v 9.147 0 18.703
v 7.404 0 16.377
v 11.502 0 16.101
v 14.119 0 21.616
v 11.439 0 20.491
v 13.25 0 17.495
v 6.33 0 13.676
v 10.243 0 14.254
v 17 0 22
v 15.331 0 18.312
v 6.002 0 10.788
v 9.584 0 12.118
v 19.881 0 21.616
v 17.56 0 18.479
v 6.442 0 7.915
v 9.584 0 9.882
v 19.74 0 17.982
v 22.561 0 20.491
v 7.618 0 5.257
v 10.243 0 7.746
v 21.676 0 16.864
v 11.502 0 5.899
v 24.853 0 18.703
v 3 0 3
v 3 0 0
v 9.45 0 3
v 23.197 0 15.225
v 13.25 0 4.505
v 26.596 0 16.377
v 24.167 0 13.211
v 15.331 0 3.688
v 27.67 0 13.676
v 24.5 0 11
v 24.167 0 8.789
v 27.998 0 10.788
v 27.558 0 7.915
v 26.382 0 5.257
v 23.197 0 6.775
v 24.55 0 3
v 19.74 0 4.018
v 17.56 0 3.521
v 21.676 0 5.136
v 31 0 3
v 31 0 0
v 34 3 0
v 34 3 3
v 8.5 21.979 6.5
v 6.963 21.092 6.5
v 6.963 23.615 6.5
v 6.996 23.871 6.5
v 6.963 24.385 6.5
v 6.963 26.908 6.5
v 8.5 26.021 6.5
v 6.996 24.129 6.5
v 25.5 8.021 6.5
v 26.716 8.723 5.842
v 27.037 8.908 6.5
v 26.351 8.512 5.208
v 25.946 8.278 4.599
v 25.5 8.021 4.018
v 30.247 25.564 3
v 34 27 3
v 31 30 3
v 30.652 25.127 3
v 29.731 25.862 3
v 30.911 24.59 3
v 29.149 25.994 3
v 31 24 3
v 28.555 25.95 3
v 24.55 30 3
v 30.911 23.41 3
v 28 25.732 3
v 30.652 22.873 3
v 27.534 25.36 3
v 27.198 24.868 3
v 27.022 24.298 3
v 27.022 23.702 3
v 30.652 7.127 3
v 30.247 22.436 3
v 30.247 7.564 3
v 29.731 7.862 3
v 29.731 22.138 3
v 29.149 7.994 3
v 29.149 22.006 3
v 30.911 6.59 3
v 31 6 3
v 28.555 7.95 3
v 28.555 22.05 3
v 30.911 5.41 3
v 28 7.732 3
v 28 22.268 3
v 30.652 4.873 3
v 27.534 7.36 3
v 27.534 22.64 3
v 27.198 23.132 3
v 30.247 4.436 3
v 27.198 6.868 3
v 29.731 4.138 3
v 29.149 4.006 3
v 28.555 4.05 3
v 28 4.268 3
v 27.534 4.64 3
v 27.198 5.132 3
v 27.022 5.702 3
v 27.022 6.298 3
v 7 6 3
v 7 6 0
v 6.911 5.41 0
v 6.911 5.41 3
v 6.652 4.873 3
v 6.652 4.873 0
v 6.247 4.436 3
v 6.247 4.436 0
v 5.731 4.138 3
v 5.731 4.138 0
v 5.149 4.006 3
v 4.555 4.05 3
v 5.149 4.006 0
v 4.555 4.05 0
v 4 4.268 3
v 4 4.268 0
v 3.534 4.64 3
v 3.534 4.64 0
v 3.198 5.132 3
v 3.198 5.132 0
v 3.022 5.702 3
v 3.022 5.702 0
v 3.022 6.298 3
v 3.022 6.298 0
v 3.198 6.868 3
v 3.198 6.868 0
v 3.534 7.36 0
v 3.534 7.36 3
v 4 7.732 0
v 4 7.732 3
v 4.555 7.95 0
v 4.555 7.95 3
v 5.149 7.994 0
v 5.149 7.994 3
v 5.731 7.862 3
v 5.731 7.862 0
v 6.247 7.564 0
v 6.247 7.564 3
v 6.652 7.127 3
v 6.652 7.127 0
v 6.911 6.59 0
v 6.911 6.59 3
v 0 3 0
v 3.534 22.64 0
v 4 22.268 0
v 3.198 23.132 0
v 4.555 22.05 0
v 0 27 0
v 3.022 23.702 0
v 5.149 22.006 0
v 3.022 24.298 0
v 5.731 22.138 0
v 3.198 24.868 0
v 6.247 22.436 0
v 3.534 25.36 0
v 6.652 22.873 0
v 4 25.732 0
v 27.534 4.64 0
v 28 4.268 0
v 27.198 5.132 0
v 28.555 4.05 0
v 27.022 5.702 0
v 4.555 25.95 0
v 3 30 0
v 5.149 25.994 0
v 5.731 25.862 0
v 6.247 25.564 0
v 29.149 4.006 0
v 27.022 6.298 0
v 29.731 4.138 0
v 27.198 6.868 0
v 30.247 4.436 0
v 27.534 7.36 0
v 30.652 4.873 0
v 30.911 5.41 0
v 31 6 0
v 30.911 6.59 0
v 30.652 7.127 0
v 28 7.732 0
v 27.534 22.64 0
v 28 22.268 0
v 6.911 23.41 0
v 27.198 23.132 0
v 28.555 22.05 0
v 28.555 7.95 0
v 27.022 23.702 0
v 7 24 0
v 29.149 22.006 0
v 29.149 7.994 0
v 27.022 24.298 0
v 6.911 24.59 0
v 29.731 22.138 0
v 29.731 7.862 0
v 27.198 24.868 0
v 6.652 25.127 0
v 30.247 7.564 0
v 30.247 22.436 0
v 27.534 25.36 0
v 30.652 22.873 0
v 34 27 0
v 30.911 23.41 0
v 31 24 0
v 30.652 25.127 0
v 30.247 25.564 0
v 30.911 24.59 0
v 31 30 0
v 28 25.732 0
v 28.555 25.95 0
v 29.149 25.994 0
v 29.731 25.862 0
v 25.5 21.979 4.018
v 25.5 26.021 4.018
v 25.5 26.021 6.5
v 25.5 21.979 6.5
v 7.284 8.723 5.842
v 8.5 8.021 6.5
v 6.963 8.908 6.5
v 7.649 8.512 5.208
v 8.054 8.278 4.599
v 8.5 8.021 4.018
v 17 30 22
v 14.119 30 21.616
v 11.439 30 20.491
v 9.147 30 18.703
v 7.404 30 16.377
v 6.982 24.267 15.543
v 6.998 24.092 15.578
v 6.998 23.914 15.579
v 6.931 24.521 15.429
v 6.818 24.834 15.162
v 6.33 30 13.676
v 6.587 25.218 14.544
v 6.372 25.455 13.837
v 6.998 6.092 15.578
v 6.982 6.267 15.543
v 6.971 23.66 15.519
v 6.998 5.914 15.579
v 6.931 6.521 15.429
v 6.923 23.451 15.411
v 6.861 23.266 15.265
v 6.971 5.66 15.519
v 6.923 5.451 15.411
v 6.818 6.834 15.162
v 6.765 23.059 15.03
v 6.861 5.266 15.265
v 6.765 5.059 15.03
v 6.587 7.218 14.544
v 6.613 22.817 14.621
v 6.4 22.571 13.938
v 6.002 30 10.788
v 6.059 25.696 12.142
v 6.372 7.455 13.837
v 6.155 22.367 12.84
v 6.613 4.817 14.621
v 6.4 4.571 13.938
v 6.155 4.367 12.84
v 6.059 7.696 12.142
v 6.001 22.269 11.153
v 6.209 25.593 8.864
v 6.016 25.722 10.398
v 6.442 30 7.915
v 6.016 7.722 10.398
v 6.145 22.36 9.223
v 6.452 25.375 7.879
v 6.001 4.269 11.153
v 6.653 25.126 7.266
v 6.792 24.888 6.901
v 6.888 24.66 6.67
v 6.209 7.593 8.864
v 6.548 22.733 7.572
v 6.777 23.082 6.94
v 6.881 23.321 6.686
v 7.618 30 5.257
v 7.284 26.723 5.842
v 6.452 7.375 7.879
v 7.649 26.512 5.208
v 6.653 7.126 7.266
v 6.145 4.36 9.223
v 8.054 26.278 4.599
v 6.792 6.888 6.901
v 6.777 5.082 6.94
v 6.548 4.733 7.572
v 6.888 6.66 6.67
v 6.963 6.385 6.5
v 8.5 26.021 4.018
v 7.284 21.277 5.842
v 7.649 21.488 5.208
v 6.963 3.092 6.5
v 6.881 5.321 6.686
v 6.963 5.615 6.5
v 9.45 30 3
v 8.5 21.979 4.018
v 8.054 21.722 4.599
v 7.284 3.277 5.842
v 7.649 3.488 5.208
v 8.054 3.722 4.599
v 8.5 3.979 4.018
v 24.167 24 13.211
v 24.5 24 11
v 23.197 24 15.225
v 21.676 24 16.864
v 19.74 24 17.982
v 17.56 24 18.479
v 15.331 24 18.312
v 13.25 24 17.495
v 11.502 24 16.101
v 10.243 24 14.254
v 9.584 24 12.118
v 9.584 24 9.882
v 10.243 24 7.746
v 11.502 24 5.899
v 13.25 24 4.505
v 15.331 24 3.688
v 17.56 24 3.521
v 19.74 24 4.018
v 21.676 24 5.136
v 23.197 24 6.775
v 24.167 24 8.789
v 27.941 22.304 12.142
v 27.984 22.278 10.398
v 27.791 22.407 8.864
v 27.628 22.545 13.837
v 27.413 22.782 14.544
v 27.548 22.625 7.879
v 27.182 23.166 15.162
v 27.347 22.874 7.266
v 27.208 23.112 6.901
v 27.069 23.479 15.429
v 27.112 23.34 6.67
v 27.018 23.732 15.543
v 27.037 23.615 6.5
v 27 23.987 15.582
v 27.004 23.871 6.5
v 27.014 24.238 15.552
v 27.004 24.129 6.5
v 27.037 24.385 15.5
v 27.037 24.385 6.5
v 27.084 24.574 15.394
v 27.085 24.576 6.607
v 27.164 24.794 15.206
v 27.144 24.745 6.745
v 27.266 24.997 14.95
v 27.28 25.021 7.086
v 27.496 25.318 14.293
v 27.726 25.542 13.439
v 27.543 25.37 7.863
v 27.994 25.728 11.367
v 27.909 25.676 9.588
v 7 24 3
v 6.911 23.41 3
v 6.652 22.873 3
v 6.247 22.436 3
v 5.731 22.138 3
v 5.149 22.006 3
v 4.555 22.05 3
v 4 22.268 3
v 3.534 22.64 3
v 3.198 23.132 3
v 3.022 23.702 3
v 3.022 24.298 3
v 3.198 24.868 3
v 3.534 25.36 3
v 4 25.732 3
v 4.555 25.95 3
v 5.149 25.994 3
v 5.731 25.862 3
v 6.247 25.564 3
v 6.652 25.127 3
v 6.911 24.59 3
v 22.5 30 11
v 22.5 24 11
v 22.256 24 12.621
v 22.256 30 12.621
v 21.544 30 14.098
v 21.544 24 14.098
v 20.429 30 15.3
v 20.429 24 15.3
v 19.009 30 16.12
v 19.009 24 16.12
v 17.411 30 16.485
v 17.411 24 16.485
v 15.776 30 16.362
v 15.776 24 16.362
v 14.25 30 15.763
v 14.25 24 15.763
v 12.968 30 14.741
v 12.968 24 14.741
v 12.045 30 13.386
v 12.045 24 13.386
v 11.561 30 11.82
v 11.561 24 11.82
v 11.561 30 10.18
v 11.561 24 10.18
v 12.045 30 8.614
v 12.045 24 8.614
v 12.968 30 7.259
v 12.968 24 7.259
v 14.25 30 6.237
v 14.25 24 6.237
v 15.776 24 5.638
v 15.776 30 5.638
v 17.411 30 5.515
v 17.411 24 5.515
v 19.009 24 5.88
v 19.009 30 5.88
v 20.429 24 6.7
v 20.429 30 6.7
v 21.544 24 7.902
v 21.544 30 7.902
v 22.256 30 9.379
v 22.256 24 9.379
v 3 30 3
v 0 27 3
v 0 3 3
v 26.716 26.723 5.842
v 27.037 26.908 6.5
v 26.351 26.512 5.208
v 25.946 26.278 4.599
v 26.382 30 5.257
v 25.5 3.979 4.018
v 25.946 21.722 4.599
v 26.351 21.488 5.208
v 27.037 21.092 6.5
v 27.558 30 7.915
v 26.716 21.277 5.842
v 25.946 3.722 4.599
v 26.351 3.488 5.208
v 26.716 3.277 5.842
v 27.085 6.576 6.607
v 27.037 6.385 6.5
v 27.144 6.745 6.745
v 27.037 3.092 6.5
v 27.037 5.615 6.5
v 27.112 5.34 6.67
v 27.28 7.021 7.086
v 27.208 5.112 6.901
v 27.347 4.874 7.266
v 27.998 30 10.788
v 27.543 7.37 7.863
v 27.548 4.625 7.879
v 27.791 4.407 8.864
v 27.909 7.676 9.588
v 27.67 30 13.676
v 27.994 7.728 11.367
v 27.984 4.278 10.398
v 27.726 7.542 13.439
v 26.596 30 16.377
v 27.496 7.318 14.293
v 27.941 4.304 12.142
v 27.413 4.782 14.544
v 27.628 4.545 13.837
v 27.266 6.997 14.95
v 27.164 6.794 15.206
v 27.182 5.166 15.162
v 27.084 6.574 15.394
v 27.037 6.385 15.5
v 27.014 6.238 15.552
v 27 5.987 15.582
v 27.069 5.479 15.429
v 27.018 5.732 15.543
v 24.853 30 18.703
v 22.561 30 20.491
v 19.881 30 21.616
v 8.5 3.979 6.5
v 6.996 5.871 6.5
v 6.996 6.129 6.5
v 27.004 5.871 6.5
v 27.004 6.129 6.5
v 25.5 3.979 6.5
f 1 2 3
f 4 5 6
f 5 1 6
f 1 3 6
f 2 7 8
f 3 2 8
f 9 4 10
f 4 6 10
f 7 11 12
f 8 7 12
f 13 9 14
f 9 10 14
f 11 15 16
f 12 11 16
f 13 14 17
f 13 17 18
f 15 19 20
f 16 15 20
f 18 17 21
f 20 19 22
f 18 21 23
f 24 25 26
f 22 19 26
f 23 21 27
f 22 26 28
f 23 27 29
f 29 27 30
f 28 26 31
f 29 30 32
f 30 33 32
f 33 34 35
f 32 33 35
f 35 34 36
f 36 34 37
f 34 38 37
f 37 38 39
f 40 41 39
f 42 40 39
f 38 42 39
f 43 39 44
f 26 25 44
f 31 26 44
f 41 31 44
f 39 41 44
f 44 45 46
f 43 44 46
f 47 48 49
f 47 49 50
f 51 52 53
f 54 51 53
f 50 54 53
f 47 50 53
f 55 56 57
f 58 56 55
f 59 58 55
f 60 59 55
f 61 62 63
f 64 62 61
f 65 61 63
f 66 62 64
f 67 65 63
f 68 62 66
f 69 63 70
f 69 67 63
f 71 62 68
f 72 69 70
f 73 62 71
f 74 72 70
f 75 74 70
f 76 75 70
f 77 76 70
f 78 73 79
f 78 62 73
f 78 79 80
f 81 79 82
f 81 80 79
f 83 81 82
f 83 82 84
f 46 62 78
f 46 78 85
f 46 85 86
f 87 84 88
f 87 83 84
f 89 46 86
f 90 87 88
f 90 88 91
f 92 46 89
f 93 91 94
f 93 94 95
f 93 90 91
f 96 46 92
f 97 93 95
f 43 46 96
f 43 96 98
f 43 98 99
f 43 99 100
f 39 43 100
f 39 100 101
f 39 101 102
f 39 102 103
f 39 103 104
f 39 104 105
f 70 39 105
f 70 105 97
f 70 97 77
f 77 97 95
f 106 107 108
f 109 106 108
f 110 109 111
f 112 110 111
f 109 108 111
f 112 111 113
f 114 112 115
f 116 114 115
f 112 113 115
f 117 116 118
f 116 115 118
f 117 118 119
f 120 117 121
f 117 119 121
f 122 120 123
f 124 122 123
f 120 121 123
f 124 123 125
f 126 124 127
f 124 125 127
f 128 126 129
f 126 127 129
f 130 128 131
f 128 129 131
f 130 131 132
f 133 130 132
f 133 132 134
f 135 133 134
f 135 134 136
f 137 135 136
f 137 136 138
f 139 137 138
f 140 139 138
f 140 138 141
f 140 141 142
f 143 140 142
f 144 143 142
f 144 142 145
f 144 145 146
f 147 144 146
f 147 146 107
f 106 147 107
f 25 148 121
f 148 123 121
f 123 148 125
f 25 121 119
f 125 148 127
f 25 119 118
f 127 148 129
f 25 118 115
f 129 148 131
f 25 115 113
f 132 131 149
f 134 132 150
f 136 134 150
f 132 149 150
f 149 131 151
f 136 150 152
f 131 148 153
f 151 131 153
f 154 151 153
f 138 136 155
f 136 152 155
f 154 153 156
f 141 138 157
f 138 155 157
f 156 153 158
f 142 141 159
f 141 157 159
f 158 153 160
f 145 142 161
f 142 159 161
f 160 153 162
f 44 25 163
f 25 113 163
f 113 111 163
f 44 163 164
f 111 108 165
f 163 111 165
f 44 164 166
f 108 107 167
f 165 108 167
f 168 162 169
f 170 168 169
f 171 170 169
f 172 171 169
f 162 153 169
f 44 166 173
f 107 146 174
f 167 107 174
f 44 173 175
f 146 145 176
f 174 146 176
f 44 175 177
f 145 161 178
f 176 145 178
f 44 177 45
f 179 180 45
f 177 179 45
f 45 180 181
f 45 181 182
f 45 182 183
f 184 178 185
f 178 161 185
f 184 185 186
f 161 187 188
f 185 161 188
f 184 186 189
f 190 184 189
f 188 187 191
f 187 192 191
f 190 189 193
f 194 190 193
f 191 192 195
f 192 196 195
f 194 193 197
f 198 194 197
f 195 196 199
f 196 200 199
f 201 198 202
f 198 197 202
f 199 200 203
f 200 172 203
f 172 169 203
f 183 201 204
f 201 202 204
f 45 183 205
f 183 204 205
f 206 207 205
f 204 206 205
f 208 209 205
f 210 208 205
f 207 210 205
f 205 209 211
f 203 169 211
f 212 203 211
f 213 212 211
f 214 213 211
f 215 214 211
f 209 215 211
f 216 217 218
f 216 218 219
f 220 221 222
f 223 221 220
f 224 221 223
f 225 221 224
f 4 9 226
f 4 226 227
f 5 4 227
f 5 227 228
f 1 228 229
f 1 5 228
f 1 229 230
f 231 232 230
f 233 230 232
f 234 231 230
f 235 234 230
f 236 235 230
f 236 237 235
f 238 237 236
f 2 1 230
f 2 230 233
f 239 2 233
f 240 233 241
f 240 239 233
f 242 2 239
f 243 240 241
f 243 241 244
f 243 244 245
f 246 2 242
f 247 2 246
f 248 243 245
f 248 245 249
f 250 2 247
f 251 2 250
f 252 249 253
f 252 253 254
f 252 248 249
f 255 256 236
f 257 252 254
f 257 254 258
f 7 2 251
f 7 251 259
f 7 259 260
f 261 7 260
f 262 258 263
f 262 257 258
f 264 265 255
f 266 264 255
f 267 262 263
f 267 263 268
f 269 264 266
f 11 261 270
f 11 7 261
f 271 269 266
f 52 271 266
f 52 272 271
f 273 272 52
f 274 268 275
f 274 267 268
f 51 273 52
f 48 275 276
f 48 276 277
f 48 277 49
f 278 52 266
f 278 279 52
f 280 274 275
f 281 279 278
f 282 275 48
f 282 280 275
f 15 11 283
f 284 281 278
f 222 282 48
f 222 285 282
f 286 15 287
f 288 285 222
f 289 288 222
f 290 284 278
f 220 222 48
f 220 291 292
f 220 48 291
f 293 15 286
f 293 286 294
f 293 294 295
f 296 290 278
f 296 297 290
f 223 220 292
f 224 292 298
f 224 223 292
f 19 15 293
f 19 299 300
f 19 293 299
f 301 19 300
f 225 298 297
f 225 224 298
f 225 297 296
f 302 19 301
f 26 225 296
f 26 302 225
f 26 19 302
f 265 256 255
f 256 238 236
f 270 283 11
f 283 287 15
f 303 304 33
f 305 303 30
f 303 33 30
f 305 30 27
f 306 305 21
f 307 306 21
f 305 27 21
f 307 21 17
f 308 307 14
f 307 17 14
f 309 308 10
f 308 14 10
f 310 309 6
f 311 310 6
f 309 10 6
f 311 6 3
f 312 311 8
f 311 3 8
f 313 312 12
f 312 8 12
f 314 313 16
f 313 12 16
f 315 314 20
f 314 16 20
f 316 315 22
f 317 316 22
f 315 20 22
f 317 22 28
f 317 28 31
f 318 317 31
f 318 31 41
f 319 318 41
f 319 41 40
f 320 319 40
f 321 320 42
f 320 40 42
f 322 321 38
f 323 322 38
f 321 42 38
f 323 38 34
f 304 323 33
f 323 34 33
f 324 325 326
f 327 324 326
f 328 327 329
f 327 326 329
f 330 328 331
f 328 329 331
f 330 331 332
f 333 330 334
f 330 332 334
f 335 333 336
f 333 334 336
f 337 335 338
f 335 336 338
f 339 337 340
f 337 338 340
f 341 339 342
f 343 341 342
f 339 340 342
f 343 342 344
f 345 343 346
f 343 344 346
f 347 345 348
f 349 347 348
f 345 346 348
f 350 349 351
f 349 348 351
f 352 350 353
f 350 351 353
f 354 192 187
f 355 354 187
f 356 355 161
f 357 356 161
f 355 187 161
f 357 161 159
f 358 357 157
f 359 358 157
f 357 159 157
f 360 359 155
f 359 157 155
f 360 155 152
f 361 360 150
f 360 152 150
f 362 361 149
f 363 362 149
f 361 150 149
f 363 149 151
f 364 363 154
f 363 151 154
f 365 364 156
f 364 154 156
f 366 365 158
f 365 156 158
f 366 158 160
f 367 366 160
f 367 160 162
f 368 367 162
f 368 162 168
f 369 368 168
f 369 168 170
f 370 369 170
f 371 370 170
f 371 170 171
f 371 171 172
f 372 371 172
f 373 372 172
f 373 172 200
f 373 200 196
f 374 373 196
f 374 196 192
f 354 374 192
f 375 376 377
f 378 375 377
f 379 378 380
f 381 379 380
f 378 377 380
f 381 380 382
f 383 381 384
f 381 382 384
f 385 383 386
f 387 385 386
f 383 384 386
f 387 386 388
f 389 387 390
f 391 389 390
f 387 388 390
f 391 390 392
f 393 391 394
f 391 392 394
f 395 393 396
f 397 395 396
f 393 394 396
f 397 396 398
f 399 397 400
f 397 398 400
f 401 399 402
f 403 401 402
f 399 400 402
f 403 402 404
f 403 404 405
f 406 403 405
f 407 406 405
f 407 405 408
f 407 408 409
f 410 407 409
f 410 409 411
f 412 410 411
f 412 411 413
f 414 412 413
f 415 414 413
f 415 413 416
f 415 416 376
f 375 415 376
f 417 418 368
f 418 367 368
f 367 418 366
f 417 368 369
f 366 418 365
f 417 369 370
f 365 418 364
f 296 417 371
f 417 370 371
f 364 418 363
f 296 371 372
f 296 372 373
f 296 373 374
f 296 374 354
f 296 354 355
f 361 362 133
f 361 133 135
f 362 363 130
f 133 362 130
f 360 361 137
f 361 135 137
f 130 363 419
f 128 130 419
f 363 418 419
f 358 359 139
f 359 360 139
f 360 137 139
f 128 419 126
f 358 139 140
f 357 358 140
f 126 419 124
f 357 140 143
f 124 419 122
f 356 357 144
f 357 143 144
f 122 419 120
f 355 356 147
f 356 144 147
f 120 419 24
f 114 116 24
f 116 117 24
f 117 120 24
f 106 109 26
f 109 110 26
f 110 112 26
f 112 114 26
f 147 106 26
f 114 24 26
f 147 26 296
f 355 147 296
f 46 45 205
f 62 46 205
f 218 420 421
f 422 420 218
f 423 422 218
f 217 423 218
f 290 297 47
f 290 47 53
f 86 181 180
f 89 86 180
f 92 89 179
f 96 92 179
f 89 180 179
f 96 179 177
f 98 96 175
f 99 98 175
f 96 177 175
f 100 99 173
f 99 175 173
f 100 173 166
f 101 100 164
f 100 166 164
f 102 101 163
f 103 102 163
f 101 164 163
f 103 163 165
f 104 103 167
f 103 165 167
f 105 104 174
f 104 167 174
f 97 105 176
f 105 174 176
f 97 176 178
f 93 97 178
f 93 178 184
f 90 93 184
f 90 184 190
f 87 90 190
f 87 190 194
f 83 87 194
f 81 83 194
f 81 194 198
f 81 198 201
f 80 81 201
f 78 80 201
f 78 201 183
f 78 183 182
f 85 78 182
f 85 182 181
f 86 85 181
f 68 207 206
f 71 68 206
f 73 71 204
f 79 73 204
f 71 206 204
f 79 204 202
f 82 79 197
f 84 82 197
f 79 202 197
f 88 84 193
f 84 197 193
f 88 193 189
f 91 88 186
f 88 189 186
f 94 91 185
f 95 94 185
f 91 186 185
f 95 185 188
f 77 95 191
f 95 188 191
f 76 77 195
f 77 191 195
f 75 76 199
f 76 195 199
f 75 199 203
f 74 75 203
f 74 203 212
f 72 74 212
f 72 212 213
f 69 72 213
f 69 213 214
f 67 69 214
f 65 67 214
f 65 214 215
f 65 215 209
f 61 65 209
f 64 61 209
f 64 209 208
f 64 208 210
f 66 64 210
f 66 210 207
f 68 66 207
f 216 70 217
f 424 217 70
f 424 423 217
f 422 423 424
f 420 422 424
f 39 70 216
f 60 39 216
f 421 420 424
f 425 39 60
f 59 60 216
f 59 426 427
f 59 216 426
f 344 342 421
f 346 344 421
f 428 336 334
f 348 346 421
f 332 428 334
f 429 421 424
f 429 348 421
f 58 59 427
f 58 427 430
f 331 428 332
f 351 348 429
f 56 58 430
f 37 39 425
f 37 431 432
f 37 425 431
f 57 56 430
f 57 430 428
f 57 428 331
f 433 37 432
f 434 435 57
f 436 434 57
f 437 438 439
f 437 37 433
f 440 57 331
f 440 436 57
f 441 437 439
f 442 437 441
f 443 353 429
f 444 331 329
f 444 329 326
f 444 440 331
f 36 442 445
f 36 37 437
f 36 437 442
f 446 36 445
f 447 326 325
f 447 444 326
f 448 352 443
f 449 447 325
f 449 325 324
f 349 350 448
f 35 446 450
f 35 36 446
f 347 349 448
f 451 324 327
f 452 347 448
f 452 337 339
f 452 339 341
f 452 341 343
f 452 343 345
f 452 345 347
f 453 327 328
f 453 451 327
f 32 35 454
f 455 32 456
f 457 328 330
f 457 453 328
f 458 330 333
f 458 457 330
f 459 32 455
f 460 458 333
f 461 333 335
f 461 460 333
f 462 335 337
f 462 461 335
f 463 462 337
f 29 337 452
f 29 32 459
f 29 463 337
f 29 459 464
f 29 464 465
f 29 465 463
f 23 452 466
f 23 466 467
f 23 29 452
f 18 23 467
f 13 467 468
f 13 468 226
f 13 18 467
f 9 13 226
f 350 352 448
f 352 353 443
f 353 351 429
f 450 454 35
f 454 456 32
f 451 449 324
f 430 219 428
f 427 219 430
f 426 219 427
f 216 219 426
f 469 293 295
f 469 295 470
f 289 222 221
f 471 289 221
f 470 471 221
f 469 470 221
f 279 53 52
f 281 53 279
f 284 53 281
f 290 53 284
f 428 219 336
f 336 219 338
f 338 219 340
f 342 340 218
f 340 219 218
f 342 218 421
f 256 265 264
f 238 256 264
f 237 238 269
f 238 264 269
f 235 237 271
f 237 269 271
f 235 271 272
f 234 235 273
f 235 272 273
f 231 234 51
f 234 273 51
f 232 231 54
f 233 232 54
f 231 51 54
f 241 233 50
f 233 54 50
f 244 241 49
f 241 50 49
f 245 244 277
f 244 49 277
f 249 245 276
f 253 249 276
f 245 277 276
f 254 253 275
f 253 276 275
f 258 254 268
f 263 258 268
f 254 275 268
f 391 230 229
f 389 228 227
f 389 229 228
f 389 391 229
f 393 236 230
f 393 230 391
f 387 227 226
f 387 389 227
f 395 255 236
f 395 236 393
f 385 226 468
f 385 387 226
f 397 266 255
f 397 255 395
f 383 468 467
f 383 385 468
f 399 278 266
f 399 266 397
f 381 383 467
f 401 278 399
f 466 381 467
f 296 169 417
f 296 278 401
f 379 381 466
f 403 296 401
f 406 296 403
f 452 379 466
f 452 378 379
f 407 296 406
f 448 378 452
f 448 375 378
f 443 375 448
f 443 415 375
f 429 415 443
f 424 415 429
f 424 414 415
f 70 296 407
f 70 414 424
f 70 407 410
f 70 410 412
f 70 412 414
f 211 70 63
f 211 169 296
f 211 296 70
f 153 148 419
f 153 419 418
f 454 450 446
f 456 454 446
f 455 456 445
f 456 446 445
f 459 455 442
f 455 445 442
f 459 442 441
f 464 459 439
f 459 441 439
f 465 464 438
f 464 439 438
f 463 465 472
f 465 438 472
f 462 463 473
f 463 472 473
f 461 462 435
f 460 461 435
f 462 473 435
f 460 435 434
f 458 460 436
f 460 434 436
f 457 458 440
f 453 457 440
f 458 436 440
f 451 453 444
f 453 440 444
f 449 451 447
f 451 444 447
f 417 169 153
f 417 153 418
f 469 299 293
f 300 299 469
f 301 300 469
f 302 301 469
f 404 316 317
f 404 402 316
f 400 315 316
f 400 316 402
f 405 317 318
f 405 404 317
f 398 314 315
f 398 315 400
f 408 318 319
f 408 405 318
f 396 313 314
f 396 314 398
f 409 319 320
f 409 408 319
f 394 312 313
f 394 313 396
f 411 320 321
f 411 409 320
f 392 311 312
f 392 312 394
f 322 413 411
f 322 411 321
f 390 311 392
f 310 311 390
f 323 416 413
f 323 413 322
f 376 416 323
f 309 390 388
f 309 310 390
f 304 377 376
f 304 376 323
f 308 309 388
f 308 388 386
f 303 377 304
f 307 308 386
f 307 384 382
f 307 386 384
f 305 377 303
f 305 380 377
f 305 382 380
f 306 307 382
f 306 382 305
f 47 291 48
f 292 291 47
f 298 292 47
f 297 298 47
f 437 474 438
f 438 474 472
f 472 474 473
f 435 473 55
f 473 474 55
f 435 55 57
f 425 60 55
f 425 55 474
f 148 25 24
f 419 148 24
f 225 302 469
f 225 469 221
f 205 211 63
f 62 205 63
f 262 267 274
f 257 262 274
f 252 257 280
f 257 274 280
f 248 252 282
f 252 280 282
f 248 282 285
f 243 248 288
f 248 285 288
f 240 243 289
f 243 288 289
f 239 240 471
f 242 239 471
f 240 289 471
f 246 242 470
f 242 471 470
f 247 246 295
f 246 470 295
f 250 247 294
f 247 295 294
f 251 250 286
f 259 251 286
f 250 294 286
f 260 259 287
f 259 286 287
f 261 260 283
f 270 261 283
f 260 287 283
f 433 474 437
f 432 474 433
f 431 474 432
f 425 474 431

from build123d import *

# Parameters (mm, degrees)
SKETCH_W        = 34
SKETCH_H        = 30
PAD_DEPTH       = 22
SKETCH001_R     = 5.5
POCKET_DEPTH    = 30.001
SKETCH002_R     = 2
POCKET001_DEPTH = 22.001
CHAMFER_SIZE    = 3
SKETCH003_R     = 7.5
POCKET002_DEPTH = 24
POCKET003_DEPTH = 3.5


with BuildPart() as part:
    # Sketch → Pad (new body)
    with BuildSketch(Plane.XY):
        with Locations((17, 15)):
            Rectangle(SKETCH_W, SKETCH_H)
    extrude(amount=PAD_DEPTH)

    # Sketch001 (on Face1 of Pad) → Pocket (cut, through all)
    with BuildSketch(Plane.XZ):
        with Locations((17, 11)):
            Circle(SKETCH001_R)
        with BuildLine():
            ThreePointArc((17, 22), (6.777476, 15.062019), (9.450166, 3))
            Line((0, 3), (9.450166, 3))
            Line((0, 22), (0, 3))
            Line((17, 22), (0, 22))
        make_face()
        with BuildLine():
            ThreePointArc((24.549834, 3), (27.222524, 15.062019), (17, 22))
            Line((17, 22), (34, 22))
            Line((34, 22), (34, 3))
            Line((34, 3), (24.549834, 3))
        make_face()
    extrude(amount=-POCKET_DEPTH, mode=Mode.SUBTRACT)

    # Sketch002 (on Face2 of Pocket) → Pocket001 (cut, through all)
    with BuildSketch(Plane(origin=(0, 0, 0), x_dir=(1, 0, 0), z_dir=(0, 0, -1))):
        with Locations((5, -6)):
            Circle(SKETCH002_R)
        with Locations((29, -6)):
            Circle(SKETCH002_R)
        with Locations((29, -24)):
            Circle(SKETCH002_R)
        with Locations((5, -24)):
            Circle(SKETCH002_R)
    extrude(amount=-POCKET001_DEPTH, mode=Mode.SUBTRACT)

    # Chamfer
    chamfer_edges = [part.edges().sort_by_distance(p)[0] for p in [
        (34, 0, 1.5),
        (34, 30, 1.5),
        (0, 30, 1.5),
        (0, 0, 1.5),
    ]]
    chamfer(chamfer_edges, length=CHAMFER_SIZE)

    # Sketch003 (on Face1 of Chamfer) → Pocket002 (cut)
    with BuildSketch(Plane.XZ):
        with Locations((17, 11)):
            Circle(SKETCH003_R)
    extrude(amount=-POCKET002_DEPTH, mode=Mode.SUBTRACT)

    # Sketch004 (on Face6 of Pocket002) → Pocket003 (cut)
    with BuildSketch(Plane.XY.offset(3)):
        Polygon((5, 28.041452), (1.5, 26.020726), (1.5, 21.979274), (5, 19.958548), (8.5, 21.979274), (8.5, 26.020726), align=None)
        Polygon((32.5, 26.020726), (29, 28.041452), (25.5, 26.020726), (25.5, 21.979274), (29, 19.958548), (32.5, 21.979274), align=None)
        Polygon((32.5, 8.020726), (29, 10.041452), (25.5, 8.020726), (25.5, 3.979274), (29, 1.958548), (32.5, 3.979274), align=None)
        Polygon((5, 10.041452), (1.5, 8.020726), (1.5, 3.979274), (5, 1.958548), (8.5, 3.979274), (8.5, 8.020726), align=None)
    extrude(amount=POCKET003_DEPTH, mode=Mode.SUBTRACT)


solid = part.part
